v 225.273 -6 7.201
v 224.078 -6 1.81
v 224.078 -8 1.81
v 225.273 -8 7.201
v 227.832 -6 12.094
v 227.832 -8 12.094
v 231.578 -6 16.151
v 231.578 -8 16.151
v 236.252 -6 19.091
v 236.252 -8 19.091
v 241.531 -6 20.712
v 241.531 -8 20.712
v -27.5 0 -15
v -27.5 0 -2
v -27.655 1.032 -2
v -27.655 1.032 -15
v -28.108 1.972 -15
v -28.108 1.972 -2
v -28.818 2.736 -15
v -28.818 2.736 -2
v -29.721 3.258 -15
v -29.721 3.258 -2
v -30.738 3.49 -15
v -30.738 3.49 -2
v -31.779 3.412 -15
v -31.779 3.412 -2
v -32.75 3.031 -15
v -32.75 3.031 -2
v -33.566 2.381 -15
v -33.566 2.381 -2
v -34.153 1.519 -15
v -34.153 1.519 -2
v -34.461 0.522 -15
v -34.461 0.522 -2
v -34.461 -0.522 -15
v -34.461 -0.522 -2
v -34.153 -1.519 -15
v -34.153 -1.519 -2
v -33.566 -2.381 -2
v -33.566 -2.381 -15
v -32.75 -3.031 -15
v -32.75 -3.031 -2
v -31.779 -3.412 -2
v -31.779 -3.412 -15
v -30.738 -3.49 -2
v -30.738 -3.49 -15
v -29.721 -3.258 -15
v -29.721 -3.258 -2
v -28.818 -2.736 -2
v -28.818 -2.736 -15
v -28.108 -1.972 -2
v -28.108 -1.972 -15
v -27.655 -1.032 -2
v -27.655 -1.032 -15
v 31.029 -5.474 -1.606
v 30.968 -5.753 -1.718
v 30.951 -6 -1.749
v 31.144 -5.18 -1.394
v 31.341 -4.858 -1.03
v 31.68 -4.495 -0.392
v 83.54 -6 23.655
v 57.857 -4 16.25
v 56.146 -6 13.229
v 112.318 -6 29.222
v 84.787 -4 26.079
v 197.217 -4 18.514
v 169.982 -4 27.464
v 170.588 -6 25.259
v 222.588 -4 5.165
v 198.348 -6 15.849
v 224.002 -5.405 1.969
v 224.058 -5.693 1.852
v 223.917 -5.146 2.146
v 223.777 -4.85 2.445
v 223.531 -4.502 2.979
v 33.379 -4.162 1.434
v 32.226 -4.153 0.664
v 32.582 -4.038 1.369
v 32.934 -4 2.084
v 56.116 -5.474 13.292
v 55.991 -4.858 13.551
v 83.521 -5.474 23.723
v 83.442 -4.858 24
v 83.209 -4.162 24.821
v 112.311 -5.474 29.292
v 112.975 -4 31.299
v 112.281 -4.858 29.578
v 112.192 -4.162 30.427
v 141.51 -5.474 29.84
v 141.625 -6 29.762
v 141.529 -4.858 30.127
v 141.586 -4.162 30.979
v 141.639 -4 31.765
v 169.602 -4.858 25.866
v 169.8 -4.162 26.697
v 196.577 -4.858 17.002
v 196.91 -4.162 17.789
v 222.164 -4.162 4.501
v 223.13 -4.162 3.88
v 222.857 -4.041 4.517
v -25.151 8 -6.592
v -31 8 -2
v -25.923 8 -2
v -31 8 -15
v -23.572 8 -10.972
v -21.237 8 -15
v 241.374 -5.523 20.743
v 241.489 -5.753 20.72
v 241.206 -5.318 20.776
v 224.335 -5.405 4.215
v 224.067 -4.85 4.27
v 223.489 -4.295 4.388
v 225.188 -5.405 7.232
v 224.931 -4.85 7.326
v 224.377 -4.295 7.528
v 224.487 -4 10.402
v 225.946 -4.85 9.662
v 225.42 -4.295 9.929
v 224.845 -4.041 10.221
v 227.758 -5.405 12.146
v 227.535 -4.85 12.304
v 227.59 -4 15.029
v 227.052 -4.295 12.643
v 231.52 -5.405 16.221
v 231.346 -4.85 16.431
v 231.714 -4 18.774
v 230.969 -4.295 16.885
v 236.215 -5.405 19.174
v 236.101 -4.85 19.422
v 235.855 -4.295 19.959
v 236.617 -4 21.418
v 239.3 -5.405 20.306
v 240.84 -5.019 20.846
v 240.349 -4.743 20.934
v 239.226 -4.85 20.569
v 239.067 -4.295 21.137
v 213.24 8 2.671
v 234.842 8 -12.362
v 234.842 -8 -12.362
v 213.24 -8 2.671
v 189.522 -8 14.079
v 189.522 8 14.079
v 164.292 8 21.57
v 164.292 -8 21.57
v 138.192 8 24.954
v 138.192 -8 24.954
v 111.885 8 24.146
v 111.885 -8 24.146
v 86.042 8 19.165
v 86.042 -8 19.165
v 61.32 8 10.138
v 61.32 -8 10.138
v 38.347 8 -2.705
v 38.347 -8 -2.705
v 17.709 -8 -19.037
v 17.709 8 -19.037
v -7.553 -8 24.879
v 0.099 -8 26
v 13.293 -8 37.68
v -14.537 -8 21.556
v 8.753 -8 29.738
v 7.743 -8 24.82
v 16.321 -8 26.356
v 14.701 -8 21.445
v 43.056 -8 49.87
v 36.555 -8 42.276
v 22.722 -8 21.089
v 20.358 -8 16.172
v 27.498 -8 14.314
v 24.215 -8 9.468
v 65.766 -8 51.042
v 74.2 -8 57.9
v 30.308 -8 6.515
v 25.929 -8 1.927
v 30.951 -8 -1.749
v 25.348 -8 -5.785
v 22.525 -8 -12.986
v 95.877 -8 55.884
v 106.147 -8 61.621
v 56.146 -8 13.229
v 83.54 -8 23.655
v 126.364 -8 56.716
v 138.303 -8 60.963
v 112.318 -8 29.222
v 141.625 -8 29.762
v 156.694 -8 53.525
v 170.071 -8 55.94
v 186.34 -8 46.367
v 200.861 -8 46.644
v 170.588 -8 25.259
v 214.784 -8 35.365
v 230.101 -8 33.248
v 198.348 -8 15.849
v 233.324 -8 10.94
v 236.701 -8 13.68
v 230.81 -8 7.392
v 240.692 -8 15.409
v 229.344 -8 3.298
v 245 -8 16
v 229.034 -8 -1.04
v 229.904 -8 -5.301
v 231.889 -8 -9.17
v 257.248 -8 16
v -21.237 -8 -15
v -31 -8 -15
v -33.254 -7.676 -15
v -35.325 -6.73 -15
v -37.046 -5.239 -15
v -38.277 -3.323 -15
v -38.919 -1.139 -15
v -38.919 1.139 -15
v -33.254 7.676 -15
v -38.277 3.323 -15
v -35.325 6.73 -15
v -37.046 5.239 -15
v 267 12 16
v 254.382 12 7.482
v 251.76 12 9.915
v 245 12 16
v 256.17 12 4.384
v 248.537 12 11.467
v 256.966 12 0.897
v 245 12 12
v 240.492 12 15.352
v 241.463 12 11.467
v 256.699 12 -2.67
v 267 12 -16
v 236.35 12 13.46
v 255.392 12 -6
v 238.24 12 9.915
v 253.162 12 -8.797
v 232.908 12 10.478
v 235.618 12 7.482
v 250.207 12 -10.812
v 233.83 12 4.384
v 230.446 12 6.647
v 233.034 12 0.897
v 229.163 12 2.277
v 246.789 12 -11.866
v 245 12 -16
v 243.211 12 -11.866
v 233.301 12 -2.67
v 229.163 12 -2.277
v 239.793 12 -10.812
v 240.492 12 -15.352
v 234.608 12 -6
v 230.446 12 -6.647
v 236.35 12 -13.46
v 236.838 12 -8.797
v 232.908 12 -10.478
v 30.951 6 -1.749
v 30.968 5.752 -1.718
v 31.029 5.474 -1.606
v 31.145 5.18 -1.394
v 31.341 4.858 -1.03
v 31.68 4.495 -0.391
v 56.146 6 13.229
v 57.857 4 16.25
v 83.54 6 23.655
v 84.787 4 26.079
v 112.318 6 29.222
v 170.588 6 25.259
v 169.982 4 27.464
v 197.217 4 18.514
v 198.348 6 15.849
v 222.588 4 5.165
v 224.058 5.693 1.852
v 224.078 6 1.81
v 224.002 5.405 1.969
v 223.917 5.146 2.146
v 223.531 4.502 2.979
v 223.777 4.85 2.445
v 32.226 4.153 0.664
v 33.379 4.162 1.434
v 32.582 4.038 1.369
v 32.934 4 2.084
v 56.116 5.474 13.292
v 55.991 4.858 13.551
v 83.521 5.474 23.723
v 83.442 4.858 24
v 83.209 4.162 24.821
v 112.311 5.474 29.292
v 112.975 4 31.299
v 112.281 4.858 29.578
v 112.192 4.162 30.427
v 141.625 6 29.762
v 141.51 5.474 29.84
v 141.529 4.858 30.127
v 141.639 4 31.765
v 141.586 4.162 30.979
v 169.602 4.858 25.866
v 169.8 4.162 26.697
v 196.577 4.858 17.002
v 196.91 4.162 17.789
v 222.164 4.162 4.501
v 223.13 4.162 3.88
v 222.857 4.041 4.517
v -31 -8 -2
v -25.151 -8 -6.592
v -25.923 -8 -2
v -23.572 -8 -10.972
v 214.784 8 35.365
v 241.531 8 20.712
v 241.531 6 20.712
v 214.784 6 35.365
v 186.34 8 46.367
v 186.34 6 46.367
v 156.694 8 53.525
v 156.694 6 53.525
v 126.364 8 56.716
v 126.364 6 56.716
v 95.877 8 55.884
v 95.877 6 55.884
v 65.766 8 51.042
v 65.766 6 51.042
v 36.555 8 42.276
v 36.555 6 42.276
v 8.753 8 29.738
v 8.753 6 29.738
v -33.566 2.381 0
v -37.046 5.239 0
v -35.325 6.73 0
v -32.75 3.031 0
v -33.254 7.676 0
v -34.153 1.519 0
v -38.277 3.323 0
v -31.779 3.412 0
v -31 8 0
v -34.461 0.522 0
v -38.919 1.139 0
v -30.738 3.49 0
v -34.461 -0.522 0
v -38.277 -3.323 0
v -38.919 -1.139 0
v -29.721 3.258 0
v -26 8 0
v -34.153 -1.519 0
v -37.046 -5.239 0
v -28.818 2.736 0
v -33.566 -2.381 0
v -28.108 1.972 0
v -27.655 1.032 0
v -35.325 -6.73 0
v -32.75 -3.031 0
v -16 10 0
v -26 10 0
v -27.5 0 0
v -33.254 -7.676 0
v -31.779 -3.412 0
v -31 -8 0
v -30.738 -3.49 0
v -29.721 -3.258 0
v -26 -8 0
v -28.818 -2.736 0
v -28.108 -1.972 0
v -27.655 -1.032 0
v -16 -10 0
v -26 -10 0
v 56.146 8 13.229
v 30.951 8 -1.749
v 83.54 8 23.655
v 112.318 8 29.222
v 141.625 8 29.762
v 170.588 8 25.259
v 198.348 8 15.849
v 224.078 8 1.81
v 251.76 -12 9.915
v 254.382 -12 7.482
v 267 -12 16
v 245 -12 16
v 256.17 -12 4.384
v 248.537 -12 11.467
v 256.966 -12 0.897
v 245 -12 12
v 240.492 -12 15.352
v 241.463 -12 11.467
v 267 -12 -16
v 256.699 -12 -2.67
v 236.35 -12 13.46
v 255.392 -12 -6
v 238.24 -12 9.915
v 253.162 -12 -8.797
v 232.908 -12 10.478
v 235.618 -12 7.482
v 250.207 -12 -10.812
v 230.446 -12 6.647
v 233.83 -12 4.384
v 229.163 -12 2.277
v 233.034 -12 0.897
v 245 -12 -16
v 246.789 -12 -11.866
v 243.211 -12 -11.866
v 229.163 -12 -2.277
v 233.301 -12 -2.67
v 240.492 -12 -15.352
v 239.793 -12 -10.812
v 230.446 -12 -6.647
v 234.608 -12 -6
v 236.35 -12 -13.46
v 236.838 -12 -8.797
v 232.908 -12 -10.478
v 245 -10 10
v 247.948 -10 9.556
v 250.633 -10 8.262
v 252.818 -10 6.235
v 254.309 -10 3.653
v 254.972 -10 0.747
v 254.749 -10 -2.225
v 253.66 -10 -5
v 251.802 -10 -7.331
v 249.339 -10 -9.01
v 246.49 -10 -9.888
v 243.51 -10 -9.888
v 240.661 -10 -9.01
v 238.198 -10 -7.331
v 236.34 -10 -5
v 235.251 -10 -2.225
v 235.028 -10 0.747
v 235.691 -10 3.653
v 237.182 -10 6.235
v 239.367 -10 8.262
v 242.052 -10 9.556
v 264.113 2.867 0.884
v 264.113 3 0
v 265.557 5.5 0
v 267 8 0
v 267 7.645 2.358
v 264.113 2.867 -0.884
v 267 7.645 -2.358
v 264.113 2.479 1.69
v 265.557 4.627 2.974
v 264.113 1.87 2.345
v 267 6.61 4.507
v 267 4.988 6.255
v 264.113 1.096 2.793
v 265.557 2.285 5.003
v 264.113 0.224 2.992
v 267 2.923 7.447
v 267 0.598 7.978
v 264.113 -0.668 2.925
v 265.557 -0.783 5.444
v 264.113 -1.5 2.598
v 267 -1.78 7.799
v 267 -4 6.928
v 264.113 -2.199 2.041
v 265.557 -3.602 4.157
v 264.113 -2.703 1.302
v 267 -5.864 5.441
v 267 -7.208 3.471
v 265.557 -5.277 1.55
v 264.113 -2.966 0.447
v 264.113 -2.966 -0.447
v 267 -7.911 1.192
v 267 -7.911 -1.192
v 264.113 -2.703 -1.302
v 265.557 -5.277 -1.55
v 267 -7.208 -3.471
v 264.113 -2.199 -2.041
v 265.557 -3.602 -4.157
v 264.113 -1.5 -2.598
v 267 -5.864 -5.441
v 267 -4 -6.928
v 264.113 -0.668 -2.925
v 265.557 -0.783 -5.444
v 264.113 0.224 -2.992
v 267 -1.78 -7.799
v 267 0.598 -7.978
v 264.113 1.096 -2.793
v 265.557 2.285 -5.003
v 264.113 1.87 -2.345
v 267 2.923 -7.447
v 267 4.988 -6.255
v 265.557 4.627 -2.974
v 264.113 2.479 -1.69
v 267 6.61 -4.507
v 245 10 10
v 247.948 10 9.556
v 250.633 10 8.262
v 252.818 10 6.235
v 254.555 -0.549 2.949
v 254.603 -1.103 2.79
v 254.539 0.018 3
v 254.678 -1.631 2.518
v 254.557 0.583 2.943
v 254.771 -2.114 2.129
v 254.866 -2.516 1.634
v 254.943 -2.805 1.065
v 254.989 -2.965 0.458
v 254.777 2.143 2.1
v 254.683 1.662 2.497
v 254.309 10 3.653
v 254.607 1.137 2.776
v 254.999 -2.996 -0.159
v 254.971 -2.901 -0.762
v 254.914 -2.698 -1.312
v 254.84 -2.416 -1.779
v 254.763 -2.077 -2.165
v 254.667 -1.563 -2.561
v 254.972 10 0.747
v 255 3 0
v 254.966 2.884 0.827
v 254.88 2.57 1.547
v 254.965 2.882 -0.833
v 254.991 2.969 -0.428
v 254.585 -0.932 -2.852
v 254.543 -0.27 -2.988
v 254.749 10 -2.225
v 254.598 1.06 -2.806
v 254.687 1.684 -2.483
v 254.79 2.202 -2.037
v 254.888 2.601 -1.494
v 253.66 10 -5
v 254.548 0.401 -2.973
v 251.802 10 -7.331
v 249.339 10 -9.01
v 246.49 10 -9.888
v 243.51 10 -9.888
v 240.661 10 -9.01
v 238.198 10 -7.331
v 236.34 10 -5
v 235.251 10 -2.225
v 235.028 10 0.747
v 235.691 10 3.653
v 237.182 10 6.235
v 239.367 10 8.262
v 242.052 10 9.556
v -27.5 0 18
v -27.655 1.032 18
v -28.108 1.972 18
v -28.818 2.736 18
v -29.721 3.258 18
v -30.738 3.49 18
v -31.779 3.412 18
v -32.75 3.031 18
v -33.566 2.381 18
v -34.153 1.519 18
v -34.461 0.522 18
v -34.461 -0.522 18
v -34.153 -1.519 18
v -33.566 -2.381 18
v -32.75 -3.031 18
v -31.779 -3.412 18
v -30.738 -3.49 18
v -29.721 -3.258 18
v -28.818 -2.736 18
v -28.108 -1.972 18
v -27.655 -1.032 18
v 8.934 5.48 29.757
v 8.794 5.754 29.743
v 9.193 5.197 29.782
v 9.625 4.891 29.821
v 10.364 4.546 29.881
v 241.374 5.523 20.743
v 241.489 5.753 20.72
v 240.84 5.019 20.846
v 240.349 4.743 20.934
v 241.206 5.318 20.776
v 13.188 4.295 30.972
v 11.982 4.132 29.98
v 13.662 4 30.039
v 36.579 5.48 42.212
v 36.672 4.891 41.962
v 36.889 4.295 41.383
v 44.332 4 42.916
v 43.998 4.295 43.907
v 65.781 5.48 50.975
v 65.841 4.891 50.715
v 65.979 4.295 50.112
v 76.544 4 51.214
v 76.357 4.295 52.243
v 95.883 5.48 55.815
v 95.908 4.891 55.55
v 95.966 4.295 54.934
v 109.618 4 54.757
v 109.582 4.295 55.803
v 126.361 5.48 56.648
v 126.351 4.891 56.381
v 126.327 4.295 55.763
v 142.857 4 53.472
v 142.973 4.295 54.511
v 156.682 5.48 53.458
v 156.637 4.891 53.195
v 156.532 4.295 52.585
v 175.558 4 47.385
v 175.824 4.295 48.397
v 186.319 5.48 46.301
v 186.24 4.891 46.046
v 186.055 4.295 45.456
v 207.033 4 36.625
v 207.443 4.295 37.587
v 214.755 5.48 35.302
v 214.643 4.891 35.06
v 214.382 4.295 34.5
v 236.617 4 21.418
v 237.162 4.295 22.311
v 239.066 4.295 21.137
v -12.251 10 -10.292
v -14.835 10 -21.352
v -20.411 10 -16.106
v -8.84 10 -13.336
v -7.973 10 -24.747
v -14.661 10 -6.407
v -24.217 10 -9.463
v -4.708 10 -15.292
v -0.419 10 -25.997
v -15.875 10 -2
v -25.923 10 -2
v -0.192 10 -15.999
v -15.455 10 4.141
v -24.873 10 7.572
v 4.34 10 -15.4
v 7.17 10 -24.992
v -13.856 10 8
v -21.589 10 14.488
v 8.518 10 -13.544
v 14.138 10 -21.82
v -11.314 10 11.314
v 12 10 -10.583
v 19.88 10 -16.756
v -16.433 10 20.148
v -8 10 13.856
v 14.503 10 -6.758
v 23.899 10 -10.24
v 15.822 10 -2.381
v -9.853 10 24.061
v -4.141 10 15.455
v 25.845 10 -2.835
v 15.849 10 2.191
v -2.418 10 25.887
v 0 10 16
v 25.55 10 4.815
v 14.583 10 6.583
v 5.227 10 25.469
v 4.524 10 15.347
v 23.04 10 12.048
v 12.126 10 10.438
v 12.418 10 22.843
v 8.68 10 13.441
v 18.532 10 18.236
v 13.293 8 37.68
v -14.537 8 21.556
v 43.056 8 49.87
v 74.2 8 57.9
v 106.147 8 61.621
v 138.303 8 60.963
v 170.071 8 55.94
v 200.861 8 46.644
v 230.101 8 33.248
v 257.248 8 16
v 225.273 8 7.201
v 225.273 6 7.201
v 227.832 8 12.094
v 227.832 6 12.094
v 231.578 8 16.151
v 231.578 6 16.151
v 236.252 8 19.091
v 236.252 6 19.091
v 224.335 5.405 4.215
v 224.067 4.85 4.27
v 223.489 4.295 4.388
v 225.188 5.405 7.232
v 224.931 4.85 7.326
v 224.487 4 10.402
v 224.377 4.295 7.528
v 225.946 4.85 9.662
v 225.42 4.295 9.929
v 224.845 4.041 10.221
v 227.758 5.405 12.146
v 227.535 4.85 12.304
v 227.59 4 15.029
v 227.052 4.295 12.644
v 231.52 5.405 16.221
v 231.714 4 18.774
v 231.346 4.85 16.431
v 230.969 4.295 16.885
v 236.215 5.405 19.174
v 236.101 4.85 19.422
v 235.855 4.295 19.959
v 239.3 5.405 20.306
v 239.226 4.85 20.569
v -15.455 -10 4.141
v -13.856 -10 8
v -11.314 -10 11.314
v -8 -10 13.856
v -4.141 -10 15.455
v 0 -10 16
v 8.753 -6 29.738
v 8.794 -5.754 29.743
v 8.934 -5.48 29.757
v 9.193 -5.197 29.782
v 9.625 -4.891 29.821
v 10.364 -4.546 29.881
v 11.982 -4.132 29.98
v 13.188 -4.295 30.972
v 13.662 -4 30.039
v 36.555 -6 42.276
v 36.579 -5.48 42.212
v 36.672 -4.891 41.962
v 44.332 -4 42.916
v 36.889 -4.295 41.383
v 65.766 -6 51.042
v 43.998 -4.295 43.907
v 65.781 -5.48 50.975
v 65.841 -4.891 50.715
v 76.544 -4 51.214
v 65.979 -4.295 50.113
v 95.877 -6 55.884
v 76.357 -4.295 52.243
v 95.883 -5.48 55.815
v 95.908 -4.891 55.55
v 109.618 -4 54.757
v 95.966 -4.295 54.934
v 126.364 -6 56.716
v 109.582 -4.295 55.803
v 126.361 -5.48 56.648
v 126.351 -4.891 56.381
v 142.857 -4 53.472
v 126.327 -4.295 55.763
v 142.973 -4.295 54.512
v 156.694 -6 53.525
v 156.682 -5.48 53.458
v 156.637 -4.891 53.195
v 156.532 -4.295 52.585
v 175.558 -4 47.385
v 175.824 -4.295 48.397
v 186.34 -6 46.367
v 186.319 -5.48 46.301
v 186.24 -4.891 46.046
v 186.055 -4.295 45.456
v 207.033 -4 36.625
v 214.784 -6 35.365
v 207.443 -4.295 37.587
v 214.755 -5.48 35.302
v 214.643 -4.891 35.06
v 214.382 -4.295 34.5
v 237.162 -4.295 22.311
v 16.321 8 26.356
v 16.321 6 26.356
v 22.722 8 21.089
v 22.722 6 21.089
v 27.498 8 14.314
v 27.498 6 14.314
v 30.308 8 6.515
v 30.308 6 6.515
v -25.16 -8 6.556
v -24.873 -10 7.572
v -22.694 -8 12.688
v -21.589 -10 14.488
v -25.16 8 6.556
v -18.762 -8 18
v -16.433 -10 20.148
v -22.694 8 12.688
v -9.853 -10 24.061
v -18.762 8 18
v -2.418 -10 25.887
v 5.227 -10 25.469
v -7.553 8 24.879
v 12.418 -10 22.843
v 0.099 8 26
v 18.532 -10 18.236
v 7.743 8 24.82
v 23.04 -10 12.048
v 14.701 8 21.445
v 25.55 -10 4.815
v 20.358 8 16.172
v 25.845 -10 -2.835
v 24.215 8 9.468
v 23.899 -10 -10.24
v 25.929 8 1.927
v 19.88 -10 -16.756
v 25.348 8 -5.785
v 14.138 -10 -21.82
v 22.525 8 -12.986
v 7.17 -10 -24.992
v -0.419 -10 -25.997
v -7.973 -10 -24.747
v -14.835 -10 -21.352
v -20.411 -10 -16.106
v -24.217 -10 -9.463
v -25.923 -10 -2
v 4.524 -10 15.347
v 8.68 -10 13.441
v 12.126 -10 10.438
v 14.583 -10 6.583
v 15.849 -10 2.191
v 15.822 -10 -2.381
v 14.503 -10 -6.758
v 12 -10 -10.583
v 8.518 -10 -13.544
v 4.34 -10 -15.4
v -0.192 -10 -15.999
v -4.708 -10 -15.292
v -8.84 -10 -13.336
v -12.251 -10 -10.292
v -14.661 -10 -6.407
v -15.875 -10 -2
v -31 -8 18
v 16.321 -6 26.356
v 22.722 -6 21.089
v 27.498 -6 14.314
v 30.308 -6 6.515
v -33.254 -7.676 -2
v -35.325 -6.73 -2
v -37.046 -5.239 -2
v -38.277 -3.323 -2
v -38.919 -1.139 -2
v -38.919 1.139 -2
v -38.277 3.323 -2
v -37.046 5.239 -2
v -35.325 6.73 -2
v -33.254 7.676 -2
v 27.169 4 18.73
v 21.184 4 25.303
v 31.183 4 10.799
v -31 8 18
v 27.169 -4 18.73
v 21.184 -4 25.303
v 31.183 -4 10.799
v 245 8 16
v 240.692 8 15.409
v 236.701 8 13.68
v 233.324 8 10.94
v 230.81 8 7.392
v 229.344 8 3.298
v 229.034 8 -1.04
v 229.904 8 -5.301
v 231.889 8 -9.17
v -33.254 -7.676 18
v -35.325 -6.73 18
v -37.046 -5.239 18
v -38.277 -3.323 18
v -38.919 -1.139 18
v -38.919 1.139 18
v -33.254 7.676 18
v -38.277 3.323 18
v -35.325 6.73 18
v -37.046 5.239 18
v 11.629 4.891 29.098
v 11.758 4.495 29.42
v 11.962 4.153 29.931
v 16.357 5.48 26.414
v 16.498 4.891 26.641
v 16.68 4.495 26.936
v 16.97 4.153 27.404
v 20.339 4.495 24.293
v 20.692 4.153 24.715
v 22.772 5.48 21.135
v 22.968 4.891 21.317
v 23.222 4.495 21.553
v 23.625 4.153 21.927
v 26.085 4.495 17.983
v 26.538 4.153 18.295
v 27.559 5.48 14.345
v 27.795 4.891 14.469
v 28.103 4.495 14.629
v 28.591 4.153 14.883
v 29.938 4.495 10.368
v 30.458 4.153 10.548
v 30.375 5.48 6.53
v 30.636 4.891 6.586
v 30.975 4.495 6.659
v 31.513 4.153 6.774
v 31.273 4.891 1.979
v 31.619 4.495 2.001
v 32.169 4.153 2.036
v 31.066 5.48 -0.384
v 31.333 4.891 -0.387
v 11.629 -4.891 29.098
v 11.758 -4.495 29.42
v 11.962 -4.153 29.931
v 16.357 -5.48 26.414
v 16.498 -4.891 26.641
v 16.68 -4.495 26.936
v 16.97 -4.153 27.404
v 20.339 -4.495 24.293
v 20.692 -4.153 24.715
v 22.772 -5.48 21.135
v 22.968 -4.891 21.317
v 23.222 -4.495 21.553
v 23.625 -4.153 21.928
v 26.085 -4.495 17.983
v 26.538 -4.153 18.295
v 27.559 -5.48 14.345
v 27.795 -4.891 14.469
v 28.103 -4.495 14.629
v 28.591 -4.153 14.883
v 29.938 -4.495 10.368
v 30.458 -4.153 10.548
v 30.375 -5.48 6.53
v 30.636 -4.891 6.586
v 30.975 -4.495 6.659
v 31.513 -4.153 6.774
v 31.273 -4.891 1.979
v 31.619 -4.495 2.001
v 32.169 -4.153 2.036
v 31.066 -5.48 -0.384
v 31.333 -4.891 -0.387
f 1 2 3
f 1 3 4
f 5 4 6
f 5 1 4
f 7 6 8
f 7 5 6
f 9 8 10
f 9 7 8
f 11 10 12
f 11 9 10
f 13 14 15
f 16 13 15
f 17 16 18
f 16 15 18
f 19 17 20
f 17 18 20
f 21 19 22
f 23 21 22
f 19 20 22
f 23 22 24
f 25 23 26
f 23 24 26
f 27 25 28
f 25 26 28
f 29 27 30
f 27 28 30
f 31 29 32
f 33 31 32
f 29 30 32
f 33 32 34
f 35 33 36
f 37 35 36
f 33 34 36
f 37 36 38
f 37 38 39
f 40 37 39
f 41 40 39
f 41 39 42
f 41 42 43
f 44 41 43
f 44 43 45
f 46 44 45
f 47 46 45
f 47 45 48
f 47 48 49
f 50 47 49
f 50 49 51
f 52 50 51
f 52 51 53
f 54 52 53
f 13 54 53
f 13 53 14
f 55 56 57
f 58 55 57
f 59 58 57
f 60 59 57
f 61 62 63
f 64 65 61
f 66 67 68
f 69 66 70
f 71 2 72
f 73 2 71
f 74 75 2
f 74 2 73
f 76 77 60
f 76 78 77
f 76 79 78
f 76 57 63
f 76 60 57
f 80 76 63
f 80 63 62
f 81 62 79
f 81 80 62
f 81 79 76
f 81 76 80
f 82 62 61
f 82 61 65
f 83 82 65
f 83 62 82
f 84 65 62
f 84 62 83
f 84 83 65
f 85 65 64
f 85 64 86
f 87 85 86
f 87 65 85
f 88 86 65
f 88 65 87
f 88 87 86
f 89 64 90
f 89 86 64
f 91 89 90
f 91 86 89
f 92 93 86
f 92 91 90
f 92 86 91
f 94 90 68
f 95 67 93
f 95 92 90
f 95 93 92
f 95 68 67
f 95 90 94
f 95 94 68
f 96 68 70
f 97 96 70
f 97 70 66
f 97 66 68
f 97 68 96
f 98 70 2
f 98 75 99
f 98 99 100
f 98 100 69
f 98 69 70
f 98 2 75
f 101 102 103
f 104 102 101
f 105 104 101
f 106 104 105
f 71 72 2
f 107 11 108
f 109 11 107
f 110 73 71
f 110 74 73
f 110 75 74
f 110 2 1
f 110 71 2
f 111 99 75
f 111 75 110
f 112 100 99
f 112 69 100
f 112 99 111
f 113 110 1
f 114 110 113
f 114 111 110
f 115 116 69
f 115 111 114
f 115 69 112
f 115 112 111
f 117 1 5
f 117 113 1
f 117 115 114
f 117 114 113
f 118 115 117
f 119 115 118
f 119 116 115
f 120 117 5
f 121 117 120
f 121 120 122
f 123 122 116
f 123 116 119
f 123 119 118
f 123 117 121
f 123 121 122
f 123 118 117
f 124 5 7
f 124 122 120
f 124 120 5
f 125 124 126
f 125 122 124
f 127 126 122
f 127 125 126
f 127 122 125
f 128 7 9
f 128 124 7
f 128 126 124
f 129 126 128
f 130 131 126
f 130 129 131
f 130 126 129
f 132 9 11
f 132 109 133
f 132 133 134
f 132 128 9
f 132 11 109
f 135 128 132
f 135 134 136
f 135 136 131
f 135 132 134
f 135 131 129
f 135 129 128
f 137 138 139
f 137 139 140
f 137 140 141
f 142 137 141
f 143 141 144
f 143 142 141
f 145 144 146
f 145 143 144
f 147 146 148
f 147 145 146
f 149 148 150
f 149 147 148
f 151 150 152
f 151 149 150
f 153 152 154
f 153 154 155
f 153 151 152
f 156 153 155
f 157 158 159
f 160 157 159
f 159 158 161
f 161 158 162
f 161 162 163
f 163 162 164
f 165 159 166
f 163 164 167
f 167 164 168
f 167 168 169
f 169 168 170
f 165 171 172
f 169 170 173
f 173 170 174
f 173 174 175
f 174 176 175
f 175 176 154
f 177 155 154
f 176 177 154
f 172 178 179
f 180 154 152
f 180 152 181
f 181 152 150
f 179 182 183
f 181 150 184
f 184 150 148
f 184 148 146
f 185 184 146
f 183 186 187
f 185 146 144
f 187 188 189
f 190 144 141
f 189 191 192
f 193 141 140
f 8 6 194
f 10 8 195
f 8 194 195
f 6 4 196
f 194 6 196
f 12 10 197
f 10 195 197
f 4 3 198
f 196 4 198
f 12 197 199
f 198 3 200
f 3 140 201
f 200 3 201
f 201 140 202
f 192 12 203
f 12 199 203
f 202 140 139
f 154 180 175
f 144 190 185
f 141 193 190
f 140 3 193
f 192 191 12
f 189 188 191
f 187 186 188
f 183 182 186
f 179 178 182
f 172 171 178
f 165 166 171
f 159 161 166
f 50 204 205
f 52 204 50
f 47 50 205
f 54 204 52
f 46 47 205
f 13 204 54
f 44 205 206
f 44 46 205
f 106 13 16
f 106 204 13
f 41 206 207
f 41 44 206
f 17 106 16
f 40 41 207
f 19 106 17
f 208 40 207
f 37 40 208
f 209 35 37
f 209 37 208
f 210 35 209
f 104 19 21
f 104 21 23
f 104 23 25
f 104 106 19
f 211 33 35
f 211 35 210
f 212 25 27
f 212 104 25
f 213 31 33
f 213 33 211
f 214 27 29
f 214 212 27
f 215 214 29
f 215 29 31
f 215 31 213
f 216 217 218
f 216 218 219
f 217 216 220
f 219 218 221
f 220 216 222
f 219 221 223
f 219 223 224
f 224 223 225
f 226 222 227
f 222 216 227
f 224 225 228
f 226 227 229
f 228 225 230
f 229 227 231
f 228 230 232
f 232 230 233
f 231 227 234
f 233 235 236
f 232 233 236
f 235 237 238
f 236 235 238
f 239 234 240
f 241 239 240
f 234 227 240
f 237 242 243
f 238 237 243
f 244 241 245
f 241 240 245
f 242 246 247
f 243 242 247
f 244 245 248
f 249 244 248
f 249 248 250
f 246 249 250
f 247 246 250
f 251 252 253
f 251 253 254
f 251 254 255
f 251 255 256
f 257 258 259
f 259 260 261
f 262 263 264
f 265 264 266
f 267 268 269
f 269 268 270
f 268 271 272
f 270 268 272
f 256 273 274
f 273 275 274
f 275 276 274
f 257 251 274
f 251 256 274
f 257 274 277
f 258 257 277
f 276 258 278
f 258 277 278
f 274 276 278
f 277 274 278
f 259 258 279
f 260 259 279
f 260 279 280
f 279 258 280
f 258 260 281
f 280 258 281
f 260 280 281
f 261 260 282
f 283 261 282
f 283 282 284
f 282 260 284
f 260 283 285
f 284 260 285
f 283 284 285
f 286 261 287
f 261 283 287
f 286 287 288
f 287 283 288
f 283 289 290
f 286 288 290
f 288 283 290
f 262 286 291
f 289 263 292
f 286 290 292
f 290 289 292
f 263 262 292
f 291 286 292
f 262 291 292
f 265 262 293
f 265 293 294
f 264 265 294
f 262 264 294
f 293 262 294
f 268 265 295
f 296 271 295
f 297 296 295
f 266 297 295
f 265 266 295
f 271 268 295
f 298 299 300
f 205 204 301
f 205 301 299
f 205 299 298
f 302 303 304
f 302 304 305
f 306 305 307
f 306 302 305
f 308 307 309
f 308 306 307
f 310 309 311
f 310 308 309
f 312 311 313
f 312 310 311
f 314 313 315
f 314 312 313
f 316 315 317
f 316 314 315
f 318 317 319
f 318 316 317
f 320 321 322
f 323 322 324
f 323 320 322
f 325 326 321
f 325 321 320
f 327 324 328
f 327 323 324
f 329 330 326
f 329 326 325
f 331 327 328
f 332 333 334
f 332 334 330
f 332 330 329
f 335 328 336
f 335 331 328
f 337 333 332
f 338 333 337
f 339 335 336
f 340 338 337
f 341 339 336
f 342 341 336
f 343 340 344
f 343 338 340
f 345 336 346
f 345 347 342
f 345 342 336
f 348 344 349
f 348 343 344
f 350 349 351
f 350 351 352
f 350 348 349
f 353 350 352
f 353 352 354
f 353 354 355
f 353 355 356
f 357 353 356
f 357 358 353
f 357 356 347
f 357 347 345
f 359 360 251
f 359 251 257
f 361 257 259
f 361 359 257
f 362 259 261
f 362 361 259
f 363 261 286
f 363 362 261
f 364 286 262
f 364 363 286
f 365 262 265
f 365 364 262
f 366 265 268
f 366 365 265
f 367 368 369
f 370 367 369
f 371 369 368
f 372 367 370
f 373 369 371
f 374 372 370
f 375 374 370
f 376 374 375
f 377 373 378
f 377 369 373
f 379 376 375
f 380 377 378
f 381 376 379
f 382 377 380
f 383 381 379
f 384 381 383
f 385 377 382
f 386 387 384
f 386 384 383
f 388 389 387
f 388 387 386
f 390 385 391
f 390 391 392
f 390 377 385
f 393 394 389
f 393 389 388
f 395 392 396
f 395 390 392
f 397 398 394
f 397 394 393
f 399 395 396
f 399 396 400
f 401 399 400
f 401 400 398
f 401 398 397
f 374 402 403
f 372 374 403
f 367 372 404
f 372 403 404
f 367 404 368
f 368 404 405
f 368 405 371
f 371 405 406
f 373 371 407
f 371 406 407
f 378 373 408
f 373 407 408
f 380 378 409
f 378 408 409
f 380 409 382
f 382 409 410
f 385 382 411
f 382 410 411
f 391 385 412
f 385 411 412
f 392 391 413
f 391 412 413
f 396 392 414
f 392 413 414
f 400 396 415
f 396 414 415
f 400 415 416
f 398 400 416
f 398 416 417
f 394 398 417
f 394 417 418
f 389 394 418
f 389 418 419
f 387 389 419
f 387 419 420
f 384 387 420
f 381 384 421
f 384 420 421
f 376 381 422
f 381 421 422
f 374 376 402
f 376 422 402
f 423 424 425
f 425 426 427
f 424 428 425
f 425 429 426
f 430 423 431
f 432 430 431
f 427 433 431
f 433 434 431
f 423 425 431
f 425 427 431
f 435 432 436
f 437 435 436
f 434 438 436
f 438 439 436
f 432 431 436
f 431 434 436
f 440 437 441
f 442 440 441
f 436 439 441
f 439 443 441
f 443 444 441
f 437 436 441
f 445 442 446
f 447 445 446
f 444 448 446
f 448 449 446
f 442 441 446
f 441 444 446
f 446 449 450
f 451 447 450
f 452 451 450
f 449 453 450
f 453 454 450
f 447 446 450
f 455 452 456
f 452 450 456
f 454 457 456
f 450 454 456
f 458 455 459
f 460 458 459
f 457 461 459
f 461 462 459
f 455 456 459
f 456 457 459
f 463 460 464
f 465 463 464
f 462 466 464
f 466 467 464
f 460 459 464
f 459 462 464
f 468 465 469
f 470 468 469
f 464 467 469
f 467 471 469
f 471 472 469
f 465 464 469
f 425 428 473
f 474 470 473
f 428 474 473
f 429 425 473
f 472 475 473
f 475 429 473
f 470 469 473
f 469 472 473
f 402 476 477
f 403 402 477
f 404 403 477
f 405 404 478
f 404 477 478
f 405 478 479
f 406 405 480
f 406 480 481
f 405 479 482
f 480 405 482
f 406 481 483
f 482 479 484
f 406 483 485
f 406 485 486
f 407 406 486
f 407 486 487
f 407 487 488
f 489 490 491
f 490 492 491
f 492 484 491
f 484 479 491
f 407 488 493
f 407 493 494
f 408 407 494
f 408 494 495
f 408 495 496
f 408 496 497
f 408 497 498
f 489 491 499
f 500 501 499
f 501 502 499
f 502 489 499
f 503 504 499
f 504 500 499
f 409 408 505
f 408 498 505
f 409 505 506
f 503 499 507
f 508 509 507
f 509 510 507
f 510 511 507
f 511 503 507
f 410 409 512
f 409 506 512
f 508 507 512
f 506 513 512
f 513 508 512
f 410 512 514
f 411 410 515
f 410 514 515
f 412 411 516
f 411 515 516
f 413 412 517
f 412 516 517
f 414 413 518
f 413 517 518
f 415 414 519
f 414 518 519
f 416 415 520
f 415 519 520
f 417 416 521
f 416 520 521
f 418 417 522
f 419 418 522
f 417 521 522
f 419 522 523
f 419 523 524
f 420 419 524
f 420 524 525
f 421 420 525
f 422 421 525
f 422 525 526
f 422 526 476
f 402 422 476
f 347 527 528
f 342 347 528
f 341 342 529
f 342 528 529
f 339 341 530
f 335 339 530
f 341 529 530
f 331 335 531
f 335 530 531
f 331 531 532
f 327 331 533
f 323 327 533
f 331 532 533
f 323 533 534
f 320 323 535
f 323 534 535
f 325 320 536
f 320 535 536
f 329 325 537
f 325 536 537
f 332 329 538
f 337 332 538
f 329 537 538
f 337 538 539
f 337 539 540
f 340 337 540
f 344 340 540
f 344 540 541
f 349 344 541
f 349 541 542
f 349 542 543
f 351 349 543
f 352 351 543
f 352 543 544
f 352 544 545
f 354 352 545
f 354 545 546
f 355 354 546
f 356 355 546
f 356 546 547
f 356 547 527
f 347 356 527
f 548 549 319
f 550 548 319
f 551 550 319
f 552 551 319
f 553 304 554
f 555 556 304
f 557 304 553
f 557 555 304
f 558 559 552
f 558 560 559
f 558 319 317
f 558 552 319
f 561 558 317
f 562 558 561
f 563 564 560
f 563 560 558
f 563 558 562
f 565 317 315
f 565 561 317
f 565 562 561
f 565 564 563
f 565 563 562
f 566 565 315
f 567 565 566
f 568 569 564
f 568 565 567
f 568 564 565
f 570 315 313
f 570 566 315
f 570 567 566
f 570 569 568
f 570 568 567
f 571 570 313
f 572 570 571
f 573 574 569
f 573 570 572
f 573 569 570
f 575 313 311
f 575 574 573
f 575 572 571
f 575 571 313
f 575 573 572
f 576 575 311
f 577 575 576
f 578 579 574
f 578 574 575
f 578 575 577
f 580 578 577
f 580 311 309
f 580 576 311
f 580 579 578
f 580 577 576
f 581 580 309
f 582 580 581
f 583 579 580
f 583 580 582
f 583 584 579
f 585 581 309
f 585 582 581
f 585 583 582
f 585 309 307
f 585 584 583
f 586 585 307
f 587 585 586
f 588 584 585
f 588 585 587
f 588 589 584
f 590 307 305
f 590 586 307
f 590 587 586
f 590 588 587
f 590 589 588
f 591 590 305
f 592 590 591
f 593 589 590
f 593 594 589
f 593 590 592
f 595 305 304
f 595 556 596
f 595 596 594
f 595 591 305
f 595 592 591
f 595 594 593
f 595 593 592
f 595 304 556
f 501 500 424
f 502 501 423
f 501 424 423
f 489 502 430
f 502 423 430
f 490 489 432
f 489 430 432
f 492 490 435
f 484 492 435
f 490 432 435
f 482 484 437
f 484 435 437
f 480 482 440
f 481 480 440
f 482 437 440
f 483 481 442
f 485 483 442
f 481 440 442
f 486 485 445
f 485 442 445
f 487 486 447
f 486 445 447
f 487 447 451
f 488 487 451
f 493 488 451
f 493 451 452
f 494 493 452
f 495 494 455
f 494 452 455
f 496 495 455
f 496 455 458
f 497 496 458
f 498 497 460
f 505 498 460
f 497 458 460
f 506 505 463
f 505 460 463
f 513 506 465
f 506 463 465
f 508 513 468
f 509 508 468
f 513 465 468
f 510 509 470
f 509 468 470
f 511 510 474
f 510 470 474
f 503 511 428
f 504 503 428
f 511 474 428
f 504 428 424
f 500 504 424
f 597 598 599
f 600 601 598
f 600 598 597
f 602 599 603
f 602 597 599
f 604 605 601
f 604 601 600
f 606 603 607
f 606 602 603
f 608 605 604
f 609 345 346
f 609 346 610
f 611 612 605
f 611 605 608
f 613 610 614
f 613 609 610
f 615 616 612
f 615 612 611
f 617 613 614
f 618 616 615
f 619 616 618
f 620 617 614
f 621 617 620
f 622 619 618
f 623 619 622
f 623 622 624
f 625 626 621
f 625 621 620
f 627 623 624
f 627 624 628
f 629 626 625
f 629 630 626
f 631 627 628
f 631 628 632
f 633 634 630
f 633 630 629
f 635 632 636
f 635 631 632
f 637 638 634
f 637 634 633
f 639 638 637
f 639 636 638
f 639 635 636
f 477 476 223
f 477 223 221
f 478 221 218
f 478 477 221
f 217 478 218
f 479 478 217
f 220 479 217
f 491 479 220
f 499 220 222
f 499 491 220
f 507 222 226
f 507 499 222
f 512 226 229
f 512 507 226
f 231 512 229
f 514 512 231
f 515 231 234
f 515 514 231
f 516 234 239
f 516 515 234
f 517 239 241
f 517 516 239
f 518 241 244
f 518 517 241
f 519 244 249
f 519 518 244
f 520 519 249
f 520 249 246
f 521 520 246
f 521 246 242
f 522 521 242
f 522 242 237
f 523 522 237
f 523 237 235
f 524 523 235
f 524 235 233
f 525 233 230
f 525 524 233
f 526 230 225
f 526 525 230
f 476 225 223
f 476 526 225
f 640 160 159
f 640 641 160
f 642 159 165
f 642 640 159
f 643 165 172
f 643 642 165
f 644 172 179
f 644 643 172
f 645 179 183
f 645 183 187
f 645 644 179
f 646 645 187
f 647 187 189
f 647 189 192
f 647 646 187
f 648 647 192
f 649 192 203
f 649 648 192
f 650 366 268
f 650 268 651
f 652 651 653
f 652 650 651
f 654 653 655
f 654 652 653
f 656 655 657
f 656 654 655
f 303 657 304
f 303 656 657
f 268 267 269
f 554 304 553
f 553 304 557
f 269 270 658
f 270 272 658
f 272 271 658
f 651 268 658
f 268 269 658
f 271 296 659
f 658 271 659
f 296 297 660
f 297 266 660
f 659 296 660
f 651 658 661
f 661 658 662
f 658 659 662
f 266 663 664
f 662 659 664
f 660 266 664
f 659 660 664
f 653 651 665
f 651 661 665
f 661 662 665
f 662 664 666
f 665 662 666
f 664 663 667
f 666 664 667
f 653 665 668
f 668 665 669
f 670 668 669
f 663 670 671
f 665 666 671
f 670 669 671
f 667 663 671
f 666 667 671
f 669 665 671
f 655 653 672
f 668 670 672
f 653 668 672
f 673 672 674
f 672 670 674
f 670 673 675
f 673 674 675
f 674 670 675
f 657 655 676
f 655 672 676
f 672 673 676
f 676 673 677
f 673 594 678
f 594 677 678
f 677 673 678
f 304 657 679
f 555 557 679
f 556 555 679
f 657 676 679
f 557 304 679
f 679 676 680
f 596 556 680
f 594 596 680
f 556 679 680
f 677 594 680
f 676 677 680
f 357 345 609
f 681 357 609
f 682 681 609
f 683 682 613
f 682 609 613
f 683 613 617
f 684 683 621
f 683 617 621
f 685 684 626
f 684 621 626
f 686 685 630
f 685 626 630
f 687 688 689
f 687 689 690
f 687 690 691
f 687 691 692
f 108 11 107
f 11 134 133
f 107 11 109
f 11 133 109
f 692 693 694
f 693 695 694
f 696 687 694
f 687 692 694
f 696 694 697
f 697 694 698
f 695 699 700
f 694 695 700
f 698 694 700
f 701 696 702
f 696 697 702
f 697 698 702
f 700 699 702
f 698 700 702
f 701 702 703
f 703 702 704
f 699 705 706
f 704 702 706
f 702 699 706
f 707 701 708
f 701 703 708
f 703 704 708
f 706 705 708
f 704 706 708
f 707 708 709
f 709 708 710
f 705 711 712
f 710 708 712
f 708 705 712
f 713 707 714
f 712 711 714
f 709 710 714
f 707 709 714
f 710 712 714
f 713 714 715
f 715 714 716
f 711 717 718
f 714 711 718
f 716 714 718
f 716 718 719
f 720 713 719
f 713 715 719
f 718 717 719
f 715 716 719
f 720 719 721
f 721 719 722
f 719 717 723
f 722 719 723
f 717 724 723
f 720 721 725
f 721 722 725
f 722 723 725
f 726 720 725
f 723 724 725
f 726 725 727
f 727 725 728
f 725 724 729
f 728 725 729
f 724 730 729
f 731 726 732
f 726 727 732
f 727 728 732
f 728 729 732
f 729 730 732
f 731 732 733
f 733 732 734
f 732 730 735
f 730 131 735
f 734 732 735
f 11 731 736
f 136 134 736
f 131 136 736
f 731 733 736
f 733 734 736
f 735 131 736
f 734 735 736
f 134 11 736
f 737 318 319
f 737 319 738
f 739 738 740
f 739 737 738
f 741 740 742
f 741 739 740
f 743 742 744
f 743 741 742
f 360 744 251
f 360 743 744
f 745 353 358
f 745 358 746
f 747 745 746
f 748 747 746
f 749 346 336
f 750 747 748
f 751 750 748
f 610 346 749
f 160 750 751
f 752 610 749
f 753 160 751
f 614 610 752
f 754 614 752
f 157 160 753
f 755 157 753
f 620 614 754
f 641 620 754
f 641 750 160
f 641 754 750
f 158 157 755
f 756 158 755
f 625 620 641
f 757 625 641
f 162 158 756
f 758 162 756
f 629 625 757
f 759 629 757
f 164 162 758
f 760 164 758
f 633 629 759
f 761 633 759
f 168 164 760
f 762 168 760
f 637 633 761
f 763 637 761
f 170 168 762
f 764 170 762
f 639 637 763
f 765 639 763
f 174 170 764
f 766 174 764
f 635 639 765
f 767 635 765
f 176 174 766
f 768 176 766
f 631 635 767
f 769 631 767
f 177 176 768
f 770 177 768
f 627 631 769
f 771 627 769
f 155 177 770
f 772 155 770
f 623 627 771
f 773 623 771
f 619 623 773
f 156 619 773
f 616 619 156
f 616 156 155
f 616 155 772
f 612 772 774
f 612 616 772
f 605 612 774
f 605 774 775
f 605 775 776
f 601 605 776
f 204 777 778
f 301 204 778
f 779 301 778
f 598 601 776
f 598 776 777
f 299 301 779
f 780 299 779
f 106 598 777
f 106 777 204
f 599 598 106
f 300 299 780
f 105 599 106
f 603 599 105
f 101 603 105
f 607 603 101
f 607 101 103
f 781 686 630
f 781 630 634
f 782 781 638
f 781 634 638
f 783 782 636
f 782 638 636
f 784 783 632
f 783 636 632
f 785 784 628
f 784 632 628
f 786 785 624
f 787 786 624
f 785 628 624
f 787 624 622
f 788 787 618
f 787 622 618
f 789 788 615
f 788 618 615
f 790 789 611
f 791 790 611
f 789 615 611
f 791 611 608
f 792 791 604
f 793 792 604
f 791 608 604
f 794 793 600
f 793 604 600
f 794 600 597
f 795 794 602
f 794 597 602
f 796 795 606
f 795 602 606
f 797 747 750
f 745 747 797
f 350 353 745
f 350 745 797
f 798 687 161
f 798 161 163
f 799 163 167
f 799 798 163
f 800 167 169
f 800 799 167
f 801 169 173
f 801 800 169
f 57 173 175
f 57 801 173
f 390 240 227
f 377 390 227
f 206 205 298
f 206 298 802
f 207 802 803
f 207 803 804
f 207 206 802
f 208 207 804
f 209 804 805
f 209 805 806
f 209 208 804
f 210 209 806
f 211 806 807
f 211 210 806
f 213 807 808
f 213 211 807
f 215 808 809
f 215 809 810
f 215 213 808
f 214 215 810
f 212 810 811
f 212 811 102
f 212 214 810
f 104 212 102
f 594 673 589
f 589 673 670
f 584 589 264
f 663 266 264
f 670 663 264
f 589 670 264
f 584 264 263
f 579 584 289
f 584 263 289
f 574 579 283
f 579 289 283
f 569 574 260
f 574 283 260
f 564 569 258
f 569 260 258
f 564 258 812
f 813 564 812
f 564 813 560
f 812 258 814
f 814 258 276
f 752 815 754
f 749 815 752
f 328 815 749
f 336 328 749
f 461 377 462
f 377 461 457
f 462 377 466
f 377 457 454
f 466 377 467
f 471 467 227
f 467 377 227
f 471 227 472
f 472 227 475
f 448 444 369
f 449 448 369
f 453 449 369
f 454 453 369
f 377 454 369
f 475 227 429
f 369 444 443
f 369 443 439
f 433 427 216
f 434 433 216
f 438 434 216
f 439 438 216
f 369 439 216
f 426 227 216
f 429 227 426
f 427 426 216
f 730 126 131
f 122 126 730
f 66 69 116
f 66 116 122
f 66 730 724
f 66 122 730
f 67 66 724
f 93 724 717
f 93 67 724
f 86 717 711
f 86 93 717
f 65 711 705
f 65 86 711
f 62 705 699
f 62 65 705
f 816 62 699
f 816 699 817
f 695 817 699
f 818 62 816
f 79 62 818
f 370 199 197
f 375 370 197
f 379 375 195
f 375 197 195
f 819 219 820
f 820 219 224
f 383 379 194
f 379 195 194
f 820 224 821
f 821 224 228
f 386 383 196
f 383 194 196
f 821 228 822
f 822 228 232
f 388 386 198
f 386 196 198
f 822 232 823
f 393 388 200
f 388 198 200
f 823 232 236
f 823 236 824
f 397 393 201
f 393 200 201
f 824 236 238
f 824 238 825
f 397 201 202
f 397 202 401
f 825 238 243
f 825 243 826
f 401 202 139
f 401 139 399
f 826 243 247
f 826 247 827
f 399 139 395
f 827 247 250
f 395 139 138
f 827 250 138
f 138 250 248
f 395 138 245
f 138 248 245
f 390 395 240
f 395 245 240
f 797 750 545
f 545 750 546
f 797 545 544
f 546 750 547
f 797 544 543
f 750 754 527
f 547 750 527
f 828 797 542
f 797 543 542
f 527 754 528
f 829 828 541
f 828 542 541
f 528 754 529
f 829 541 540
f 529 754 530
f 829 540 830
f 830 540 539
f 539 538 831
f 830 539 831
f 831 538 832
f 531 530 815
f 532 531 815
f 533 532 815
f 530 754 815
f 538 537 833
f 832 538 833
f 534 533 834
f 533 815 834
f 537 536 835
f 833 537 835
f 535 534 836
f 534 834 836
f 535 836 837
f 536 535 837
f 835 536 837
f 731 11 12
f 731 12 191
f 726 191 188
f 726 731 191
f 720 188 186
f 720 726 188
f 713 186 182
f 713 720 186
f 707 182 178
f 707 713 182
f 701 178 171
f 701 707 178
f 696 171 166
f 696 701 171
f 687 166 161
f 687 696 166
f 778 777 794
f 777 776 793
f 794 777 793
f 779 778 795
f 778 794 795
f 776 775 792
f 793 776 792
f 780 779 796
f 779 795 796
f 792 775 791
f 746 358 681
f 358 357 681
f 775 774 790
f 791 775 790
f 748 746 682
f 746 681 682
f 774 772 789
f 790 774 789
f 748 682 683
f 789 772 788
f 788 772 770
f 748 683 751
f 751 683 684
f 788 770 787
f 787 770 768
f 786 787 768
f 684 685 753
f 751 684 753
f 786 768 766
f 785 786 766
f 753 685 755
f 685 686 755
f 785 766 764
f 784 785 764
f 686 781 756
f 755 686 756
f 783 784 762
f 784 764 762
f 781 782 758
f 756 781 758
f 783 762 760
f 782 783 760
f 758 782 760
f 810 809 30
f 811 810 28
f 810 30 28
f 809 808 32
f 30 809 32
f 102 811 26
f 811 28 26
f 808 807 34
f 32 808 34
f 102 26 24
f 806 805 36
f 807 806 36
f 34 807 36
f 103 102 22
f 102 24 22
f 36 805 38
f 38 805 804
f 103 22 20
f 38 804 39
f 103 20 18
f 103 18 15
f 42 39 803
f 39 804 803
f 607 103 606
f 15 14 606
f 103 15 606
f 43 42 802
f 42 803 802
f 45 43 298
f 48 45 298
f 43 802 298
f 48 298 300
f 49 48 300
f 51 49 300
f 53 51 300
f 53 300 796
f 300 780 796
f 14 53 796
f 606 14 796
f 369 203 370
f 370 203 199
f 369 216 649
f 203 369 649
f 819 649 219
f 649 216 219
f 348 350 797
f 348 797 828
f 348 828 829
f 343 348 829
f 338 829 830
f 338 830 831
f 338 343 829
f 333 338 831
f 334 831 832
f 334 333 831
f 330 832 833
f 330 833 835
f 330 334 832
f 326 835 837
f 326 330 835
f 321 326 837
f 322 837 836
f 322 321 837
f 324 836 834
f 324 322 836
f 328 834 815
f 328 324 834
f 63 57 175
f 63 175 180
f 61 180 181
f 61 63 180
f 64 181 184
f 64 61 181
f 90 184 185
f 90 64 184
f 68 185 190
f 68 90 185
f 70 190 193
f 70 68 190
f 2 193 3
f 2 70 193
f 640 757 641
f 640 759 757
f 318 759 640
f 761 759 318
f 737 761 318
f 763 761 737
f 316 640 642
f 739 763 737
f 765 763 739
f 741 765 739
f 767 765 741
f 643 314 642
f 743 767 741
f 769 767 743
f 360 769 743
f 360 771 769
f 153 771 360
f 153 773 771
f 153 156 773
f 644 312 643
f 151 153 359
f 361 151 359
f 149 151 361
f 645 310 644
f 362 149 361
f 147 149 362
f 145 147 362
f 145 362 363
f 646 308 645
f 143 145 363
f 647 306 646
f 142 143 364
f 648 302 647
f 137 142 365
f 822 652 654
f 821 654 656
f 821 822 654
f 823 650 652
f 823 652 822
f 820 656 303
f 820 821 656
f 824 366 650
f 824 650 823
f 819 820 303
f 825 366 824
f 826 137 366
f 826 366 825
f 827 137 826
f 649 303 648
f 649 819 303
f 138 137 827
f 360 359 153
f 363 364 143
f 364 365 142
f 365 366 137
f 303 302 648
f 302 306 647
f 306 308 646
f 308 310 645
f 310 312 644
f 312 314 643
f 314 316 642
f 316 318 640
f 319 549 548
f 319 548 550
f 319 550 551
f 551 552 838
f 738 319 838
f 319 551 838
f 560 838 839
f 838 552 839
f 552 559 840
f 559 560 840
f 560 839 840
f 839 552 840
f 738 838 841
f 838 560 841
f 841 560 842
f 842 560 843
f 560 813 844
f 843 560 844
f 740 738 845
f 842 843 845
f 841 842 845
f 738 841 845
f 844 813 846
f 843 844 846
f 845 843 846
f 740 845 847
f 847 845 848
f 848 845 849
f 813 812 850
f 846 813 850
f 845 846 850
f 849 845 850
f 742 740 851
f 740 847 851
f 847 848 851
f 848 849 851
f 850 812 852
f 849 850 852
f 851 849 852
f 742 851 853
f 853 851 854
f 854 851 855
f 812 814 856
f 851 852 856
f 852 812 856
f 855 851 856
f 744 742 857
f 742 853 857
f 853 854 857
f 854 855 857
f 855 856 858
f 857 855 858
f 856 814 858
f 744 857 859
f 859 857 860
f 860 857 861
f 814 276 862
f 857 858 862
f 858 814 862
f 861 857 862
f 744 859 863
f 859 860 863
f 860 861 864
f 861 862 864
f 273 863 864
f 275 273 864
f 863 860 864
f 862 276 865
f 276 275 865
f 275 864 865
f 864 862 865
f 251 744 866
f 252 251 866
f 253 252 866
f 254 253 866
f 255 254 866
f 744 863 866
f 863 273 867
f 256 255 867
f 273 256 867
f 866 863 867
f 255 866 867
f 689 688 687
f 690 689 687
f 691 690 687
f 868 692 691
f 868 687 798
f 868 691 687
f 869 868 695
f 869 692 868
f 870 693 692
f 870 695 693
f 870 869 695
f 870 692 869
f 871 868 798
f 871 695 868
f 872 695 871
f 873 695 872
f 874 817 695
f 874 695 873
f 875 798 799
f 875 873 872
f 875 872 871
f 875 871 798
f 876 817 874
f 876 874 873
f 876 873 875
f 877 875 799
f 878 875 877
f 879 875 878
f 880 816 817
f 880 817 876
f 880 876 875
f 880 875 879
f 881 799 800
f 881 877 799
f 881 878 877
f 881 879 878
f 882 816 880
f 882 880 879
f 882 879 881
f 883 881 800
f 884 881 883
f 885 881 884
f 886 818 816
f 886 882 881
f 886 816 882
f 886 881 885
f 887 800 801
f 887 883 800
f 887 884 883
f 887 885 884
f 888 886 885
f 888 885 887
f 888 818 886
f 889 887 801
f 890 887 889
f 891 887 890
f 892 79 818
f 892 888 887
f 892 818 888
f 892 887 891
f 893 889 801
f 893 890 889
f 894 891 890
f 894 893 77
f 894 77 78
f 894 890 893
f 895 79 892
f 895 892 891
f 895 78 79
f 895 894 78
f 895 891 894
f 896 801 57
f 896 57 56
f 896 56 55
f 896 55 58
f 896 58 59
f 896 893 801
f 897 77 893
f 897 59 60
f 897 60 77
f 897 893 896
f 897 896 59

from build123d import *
from build123d.topology import SkipClean

# Parameters (mm, degrees)
SKETCH_1_R               = 26
EXTRUDE_1_DEPTH          = 10
EXTRUDE_2_DEPTH          = 12
EXTRUDE_3_DEPTH          = 4
EXTRUDE_4_DEPTH          = 8
EXTRUDE_START            = -15
EXTRUDE_5_DEPTH          = 33
SKETCH_6_R               = 3.5
CUT_EXTRUDE_1_DEPTH      = 271.867126097
SKETCH_7_R               = 16
CUT_EXTRUDE_2_DEPTH      = 275.960646248
CUT_EXTRUDE_3_DEPTH      = 275.341679271
CUT_EXTRUDE_3_DEPTH_BACK = 275.341679271
SKETCH_8_W               = 47.47924493
SKETCH_8_H               = 2
SKETCH_9_R               = 10
CUT_EXTRUDE_4_DEPTH      = 276.127892052
CHAMFER_1_SIZE           = 2
FILLET_1_R               = 2


# Read off the part's stored shape, not the designer's step: Ø6.0mm 暗销孔1
with BuildPart() as part:
    # 草图1 → 凸台-拉伸1 (new, symmetric)
    with BuildSketch(Plane(origin=(0, 0, 0), x_dir=(1, 0, 0), z_dir=(0, 1, 0))):
        with Locations(Location((0, 0, 0), (0, 0, 270))):
            Circle(SKETCH_1_R)
    extrude(amount=EXTRUDE_1_DEPTH, both=True)



with BuildPart() as body_2:
    # 草图2 → 凸台-拉伸2 (new, symmetric)
    with BuildSketch(Plane(origin=(0, 0, 0), x_dir=(1, 0, 0), z_dir=(0, 1, 0))):
        with BuildLine():
            Line((245, 16), (267, 16))
            Line((267, 16), (267, -16))
            Line((267, -16), (245, -16))
            ThreePointArc((245, -16), (229, 0), (245, 16))
        make_face()
    extrude(amount=EXTRUDE_2_DEPTH, both=True)


with BuildPart() as part_1:
    add(part.part)

    add(body_2.part)  # 凸台-拉伸3 merges body 2
    # 草图3 → 凸台-拉伸3 (add, symmetric)
    with BuildSketch(Plane(origin=(0, 0, 0), x_dir=(1, 0, 0), z_dir=(0, 1, 0))):
        with BuildLine():
            Line((245, -16), (257.248496817, -16))
            ThreePointArc((257.248496817, -16), (122.236247563, -61.840572391), (-14.536770014, -21.556491309))
            ThreePointArc((-14.536770014, -21.556491309), (20.358485161, -16.17195356), (17.708836414, 19.036730624))
            ThreePointArc((17.708836414, 19.036730624), (125.0222059, -25.075347424), (234.842372308, 12.362143814))
            ThreePointArc((234.842372308, 12.362143814), (229.936894394, -5.394705691), (245, -16))
        make_face()
    extrude(amount=EXTRUDE_3_DEPTH, both=True)

    # 草图4 → 凸台-拉伸4 (add, symmetric)
    with SkipClean():  # the faces are left unmerged after this step: merging them gives an invalid solid
        with BuildSketch(Plane(origin=(0, 0, 0), x_dir=(1, 0, 0), z_dir=(0, 1, 0))):
            with BuildLine():
                Line((257.248496817, -16), (245, -16))
                ThreePointArc((245, -16), (229.936894394, -5.394705691), (234.842372308, 12.362143814))
                ThreePointArc((234.842372308, 12.362143814), (125.0222059, -25.075347424), (17.708836414, 19.036730624))
                ThreePointArc((17.708836414, 19.036730624), (20.358485161, -16.17195356), (-14.536770014, -21.556491309))
                ThreePointArc((-14.536770014, -21.556491309), (122.236247563, -61.840572391), (257.248496817, -16))
            make_face()
            with BuildLine():
                ThreePointArc((224.078129878, -1.809792966), (229.571334836, -14.24627289), (241.531331279, -20.711550818))
                ThreePointArc((241.531331279, -20.711550818), (126.363618071, -56.716382465), (8.753490395, -29.738466771))
                ThreePointArc((8.753490395, -29.738466771), (25.337079445, -17.861478248), (30.950628442, 1.74888508))
                ThreePointArc((30.950628442, 1.74888508), (126.959850958, -30.124394673), (224.078129878, -1.809792966))
            make_face(mode=Mode.SUBTRACT)
        extrude(amount=EXTRUDE_4_DEPTH, both=True)
    add(part_1.part.scale(1), mode=Mode.REPLACE)  # the faces are merged on a copy

    # 草图5 → 凸台-拉伸5 (add)
    with BuildSketch(Plane.XY.offset(EXTRUDE_START)):
        with BuildLine():
            Line((0, -8), (-31, -8))
            ThreePointArc((-31, -8), (-39, 0), (-31, 8))
            Line((-31, 8), (0, 8))
            ThreePointArc((0, 8), (8, 0), (0, -8))
        make_face()
    extrude(amount=EXTRUDE_5_DEPTH)

    # 草图6 → 切除-拉伸1 (cut, through all)
    with BuildSketch(Plane.XY.offset(18)):
        with Locations((-31, 0)):
            Circle(SKETCH_6_R)
    extrude(amount=-CUT_EXTRUDE_1_DEPTH, mode=Mode.SUBTRACT)

    # 草图7 → 切除-拉伸2 (cut, through all)
    with BuildSketch(Plane(origin=(0, 10, 0), x_dir=(1, 0, 0), z_dir=(0, 1, 0))):
        with Locations(Location((0, 0, 0), (0, 0, 270))):
            Circle(SKETCH_7_R)
    extrude(amount=-CUT_EXTRUDE_2_DEPTH, mode=Mode.SUBTRACT)

    # 草图8 → 切除-拉伸3 (cut, two sides: drawn at the far end of the back side and taken through both)
    with BuildSketch(Plane(origin=(0, 0, 0), x_dir=(1, 0, 0), z_dir=(0, 1, 0)).offset(-CUT_EXTRUDE_3_DEPTH_BACK)):
        with Locations((-23.739622465, 1)):
            Rectangle(SKETCH_8_W, SKETCH_8_H)
    extrude(amount=CUT_EXTRUDE_3_DEPTH + CUT_EXTRUDE_3_DEPTH_BACK, mode=Mode.SUBTRACT)

    # 草图9 → 切除-拉伸4 (cut, through all)
    with BuildSketch(Plane(origin=(0, 12, 0), x_dir=(1, 0, 0), z_dir=(0, 1, 0))):
        with Locations(Location((245, 0, 0), (0, 0, 270))):
            Circle(SKETCH_9_R)
    extrude(amount=-CUT_EXTRUDE_4_DEPTH, mode=Mode.SUBTRACT)

    # 倒角1
    chamfer_1_edges = [part_1.edges().sort_by_distance(p)[0] for p in [
        (245, -12, -10),
        (245, 12, -10),
    ]]
    chamfer(chamfer_1_edges, length=CHAMFER_1_SIZE)

    # 圆角1
    fillet_1_edges = [part_1.edges().sort_by_distance(p)[0] for p in [
        (25.337079445, -4, 17.861478248),
        (126.959850958, -4, 30.124394673),
        (229.571334836, -4, 14.24627289),
        (126.363618071, -4, 56.716382465),
        (126.363618071, 4, 56.716382465),
        (229.571334836, 4, 14.24627289),
        (126.959850958, 4, 30.124394673),
        (25.337079445, 4, 17.861478248),
    ]]
    fillet(fillet_1_edges, radius=FILLET_1_R)

    # Ø6.0mm 暗销孔1 outline → Ø6.0mm 暗销孔1 (revolve, cut)
    with BuildSketch(Plane.YX):
        Polygon((0, 254.53912622), (3, 254.53912622), (3, 264.113248654), (8, 267), (0, 267), align=None)
    revolve(axis=Axis((0, 0, 0), (1, 0, 0)), mode=Mode.SUBTRACT)


solid = part_1.part
